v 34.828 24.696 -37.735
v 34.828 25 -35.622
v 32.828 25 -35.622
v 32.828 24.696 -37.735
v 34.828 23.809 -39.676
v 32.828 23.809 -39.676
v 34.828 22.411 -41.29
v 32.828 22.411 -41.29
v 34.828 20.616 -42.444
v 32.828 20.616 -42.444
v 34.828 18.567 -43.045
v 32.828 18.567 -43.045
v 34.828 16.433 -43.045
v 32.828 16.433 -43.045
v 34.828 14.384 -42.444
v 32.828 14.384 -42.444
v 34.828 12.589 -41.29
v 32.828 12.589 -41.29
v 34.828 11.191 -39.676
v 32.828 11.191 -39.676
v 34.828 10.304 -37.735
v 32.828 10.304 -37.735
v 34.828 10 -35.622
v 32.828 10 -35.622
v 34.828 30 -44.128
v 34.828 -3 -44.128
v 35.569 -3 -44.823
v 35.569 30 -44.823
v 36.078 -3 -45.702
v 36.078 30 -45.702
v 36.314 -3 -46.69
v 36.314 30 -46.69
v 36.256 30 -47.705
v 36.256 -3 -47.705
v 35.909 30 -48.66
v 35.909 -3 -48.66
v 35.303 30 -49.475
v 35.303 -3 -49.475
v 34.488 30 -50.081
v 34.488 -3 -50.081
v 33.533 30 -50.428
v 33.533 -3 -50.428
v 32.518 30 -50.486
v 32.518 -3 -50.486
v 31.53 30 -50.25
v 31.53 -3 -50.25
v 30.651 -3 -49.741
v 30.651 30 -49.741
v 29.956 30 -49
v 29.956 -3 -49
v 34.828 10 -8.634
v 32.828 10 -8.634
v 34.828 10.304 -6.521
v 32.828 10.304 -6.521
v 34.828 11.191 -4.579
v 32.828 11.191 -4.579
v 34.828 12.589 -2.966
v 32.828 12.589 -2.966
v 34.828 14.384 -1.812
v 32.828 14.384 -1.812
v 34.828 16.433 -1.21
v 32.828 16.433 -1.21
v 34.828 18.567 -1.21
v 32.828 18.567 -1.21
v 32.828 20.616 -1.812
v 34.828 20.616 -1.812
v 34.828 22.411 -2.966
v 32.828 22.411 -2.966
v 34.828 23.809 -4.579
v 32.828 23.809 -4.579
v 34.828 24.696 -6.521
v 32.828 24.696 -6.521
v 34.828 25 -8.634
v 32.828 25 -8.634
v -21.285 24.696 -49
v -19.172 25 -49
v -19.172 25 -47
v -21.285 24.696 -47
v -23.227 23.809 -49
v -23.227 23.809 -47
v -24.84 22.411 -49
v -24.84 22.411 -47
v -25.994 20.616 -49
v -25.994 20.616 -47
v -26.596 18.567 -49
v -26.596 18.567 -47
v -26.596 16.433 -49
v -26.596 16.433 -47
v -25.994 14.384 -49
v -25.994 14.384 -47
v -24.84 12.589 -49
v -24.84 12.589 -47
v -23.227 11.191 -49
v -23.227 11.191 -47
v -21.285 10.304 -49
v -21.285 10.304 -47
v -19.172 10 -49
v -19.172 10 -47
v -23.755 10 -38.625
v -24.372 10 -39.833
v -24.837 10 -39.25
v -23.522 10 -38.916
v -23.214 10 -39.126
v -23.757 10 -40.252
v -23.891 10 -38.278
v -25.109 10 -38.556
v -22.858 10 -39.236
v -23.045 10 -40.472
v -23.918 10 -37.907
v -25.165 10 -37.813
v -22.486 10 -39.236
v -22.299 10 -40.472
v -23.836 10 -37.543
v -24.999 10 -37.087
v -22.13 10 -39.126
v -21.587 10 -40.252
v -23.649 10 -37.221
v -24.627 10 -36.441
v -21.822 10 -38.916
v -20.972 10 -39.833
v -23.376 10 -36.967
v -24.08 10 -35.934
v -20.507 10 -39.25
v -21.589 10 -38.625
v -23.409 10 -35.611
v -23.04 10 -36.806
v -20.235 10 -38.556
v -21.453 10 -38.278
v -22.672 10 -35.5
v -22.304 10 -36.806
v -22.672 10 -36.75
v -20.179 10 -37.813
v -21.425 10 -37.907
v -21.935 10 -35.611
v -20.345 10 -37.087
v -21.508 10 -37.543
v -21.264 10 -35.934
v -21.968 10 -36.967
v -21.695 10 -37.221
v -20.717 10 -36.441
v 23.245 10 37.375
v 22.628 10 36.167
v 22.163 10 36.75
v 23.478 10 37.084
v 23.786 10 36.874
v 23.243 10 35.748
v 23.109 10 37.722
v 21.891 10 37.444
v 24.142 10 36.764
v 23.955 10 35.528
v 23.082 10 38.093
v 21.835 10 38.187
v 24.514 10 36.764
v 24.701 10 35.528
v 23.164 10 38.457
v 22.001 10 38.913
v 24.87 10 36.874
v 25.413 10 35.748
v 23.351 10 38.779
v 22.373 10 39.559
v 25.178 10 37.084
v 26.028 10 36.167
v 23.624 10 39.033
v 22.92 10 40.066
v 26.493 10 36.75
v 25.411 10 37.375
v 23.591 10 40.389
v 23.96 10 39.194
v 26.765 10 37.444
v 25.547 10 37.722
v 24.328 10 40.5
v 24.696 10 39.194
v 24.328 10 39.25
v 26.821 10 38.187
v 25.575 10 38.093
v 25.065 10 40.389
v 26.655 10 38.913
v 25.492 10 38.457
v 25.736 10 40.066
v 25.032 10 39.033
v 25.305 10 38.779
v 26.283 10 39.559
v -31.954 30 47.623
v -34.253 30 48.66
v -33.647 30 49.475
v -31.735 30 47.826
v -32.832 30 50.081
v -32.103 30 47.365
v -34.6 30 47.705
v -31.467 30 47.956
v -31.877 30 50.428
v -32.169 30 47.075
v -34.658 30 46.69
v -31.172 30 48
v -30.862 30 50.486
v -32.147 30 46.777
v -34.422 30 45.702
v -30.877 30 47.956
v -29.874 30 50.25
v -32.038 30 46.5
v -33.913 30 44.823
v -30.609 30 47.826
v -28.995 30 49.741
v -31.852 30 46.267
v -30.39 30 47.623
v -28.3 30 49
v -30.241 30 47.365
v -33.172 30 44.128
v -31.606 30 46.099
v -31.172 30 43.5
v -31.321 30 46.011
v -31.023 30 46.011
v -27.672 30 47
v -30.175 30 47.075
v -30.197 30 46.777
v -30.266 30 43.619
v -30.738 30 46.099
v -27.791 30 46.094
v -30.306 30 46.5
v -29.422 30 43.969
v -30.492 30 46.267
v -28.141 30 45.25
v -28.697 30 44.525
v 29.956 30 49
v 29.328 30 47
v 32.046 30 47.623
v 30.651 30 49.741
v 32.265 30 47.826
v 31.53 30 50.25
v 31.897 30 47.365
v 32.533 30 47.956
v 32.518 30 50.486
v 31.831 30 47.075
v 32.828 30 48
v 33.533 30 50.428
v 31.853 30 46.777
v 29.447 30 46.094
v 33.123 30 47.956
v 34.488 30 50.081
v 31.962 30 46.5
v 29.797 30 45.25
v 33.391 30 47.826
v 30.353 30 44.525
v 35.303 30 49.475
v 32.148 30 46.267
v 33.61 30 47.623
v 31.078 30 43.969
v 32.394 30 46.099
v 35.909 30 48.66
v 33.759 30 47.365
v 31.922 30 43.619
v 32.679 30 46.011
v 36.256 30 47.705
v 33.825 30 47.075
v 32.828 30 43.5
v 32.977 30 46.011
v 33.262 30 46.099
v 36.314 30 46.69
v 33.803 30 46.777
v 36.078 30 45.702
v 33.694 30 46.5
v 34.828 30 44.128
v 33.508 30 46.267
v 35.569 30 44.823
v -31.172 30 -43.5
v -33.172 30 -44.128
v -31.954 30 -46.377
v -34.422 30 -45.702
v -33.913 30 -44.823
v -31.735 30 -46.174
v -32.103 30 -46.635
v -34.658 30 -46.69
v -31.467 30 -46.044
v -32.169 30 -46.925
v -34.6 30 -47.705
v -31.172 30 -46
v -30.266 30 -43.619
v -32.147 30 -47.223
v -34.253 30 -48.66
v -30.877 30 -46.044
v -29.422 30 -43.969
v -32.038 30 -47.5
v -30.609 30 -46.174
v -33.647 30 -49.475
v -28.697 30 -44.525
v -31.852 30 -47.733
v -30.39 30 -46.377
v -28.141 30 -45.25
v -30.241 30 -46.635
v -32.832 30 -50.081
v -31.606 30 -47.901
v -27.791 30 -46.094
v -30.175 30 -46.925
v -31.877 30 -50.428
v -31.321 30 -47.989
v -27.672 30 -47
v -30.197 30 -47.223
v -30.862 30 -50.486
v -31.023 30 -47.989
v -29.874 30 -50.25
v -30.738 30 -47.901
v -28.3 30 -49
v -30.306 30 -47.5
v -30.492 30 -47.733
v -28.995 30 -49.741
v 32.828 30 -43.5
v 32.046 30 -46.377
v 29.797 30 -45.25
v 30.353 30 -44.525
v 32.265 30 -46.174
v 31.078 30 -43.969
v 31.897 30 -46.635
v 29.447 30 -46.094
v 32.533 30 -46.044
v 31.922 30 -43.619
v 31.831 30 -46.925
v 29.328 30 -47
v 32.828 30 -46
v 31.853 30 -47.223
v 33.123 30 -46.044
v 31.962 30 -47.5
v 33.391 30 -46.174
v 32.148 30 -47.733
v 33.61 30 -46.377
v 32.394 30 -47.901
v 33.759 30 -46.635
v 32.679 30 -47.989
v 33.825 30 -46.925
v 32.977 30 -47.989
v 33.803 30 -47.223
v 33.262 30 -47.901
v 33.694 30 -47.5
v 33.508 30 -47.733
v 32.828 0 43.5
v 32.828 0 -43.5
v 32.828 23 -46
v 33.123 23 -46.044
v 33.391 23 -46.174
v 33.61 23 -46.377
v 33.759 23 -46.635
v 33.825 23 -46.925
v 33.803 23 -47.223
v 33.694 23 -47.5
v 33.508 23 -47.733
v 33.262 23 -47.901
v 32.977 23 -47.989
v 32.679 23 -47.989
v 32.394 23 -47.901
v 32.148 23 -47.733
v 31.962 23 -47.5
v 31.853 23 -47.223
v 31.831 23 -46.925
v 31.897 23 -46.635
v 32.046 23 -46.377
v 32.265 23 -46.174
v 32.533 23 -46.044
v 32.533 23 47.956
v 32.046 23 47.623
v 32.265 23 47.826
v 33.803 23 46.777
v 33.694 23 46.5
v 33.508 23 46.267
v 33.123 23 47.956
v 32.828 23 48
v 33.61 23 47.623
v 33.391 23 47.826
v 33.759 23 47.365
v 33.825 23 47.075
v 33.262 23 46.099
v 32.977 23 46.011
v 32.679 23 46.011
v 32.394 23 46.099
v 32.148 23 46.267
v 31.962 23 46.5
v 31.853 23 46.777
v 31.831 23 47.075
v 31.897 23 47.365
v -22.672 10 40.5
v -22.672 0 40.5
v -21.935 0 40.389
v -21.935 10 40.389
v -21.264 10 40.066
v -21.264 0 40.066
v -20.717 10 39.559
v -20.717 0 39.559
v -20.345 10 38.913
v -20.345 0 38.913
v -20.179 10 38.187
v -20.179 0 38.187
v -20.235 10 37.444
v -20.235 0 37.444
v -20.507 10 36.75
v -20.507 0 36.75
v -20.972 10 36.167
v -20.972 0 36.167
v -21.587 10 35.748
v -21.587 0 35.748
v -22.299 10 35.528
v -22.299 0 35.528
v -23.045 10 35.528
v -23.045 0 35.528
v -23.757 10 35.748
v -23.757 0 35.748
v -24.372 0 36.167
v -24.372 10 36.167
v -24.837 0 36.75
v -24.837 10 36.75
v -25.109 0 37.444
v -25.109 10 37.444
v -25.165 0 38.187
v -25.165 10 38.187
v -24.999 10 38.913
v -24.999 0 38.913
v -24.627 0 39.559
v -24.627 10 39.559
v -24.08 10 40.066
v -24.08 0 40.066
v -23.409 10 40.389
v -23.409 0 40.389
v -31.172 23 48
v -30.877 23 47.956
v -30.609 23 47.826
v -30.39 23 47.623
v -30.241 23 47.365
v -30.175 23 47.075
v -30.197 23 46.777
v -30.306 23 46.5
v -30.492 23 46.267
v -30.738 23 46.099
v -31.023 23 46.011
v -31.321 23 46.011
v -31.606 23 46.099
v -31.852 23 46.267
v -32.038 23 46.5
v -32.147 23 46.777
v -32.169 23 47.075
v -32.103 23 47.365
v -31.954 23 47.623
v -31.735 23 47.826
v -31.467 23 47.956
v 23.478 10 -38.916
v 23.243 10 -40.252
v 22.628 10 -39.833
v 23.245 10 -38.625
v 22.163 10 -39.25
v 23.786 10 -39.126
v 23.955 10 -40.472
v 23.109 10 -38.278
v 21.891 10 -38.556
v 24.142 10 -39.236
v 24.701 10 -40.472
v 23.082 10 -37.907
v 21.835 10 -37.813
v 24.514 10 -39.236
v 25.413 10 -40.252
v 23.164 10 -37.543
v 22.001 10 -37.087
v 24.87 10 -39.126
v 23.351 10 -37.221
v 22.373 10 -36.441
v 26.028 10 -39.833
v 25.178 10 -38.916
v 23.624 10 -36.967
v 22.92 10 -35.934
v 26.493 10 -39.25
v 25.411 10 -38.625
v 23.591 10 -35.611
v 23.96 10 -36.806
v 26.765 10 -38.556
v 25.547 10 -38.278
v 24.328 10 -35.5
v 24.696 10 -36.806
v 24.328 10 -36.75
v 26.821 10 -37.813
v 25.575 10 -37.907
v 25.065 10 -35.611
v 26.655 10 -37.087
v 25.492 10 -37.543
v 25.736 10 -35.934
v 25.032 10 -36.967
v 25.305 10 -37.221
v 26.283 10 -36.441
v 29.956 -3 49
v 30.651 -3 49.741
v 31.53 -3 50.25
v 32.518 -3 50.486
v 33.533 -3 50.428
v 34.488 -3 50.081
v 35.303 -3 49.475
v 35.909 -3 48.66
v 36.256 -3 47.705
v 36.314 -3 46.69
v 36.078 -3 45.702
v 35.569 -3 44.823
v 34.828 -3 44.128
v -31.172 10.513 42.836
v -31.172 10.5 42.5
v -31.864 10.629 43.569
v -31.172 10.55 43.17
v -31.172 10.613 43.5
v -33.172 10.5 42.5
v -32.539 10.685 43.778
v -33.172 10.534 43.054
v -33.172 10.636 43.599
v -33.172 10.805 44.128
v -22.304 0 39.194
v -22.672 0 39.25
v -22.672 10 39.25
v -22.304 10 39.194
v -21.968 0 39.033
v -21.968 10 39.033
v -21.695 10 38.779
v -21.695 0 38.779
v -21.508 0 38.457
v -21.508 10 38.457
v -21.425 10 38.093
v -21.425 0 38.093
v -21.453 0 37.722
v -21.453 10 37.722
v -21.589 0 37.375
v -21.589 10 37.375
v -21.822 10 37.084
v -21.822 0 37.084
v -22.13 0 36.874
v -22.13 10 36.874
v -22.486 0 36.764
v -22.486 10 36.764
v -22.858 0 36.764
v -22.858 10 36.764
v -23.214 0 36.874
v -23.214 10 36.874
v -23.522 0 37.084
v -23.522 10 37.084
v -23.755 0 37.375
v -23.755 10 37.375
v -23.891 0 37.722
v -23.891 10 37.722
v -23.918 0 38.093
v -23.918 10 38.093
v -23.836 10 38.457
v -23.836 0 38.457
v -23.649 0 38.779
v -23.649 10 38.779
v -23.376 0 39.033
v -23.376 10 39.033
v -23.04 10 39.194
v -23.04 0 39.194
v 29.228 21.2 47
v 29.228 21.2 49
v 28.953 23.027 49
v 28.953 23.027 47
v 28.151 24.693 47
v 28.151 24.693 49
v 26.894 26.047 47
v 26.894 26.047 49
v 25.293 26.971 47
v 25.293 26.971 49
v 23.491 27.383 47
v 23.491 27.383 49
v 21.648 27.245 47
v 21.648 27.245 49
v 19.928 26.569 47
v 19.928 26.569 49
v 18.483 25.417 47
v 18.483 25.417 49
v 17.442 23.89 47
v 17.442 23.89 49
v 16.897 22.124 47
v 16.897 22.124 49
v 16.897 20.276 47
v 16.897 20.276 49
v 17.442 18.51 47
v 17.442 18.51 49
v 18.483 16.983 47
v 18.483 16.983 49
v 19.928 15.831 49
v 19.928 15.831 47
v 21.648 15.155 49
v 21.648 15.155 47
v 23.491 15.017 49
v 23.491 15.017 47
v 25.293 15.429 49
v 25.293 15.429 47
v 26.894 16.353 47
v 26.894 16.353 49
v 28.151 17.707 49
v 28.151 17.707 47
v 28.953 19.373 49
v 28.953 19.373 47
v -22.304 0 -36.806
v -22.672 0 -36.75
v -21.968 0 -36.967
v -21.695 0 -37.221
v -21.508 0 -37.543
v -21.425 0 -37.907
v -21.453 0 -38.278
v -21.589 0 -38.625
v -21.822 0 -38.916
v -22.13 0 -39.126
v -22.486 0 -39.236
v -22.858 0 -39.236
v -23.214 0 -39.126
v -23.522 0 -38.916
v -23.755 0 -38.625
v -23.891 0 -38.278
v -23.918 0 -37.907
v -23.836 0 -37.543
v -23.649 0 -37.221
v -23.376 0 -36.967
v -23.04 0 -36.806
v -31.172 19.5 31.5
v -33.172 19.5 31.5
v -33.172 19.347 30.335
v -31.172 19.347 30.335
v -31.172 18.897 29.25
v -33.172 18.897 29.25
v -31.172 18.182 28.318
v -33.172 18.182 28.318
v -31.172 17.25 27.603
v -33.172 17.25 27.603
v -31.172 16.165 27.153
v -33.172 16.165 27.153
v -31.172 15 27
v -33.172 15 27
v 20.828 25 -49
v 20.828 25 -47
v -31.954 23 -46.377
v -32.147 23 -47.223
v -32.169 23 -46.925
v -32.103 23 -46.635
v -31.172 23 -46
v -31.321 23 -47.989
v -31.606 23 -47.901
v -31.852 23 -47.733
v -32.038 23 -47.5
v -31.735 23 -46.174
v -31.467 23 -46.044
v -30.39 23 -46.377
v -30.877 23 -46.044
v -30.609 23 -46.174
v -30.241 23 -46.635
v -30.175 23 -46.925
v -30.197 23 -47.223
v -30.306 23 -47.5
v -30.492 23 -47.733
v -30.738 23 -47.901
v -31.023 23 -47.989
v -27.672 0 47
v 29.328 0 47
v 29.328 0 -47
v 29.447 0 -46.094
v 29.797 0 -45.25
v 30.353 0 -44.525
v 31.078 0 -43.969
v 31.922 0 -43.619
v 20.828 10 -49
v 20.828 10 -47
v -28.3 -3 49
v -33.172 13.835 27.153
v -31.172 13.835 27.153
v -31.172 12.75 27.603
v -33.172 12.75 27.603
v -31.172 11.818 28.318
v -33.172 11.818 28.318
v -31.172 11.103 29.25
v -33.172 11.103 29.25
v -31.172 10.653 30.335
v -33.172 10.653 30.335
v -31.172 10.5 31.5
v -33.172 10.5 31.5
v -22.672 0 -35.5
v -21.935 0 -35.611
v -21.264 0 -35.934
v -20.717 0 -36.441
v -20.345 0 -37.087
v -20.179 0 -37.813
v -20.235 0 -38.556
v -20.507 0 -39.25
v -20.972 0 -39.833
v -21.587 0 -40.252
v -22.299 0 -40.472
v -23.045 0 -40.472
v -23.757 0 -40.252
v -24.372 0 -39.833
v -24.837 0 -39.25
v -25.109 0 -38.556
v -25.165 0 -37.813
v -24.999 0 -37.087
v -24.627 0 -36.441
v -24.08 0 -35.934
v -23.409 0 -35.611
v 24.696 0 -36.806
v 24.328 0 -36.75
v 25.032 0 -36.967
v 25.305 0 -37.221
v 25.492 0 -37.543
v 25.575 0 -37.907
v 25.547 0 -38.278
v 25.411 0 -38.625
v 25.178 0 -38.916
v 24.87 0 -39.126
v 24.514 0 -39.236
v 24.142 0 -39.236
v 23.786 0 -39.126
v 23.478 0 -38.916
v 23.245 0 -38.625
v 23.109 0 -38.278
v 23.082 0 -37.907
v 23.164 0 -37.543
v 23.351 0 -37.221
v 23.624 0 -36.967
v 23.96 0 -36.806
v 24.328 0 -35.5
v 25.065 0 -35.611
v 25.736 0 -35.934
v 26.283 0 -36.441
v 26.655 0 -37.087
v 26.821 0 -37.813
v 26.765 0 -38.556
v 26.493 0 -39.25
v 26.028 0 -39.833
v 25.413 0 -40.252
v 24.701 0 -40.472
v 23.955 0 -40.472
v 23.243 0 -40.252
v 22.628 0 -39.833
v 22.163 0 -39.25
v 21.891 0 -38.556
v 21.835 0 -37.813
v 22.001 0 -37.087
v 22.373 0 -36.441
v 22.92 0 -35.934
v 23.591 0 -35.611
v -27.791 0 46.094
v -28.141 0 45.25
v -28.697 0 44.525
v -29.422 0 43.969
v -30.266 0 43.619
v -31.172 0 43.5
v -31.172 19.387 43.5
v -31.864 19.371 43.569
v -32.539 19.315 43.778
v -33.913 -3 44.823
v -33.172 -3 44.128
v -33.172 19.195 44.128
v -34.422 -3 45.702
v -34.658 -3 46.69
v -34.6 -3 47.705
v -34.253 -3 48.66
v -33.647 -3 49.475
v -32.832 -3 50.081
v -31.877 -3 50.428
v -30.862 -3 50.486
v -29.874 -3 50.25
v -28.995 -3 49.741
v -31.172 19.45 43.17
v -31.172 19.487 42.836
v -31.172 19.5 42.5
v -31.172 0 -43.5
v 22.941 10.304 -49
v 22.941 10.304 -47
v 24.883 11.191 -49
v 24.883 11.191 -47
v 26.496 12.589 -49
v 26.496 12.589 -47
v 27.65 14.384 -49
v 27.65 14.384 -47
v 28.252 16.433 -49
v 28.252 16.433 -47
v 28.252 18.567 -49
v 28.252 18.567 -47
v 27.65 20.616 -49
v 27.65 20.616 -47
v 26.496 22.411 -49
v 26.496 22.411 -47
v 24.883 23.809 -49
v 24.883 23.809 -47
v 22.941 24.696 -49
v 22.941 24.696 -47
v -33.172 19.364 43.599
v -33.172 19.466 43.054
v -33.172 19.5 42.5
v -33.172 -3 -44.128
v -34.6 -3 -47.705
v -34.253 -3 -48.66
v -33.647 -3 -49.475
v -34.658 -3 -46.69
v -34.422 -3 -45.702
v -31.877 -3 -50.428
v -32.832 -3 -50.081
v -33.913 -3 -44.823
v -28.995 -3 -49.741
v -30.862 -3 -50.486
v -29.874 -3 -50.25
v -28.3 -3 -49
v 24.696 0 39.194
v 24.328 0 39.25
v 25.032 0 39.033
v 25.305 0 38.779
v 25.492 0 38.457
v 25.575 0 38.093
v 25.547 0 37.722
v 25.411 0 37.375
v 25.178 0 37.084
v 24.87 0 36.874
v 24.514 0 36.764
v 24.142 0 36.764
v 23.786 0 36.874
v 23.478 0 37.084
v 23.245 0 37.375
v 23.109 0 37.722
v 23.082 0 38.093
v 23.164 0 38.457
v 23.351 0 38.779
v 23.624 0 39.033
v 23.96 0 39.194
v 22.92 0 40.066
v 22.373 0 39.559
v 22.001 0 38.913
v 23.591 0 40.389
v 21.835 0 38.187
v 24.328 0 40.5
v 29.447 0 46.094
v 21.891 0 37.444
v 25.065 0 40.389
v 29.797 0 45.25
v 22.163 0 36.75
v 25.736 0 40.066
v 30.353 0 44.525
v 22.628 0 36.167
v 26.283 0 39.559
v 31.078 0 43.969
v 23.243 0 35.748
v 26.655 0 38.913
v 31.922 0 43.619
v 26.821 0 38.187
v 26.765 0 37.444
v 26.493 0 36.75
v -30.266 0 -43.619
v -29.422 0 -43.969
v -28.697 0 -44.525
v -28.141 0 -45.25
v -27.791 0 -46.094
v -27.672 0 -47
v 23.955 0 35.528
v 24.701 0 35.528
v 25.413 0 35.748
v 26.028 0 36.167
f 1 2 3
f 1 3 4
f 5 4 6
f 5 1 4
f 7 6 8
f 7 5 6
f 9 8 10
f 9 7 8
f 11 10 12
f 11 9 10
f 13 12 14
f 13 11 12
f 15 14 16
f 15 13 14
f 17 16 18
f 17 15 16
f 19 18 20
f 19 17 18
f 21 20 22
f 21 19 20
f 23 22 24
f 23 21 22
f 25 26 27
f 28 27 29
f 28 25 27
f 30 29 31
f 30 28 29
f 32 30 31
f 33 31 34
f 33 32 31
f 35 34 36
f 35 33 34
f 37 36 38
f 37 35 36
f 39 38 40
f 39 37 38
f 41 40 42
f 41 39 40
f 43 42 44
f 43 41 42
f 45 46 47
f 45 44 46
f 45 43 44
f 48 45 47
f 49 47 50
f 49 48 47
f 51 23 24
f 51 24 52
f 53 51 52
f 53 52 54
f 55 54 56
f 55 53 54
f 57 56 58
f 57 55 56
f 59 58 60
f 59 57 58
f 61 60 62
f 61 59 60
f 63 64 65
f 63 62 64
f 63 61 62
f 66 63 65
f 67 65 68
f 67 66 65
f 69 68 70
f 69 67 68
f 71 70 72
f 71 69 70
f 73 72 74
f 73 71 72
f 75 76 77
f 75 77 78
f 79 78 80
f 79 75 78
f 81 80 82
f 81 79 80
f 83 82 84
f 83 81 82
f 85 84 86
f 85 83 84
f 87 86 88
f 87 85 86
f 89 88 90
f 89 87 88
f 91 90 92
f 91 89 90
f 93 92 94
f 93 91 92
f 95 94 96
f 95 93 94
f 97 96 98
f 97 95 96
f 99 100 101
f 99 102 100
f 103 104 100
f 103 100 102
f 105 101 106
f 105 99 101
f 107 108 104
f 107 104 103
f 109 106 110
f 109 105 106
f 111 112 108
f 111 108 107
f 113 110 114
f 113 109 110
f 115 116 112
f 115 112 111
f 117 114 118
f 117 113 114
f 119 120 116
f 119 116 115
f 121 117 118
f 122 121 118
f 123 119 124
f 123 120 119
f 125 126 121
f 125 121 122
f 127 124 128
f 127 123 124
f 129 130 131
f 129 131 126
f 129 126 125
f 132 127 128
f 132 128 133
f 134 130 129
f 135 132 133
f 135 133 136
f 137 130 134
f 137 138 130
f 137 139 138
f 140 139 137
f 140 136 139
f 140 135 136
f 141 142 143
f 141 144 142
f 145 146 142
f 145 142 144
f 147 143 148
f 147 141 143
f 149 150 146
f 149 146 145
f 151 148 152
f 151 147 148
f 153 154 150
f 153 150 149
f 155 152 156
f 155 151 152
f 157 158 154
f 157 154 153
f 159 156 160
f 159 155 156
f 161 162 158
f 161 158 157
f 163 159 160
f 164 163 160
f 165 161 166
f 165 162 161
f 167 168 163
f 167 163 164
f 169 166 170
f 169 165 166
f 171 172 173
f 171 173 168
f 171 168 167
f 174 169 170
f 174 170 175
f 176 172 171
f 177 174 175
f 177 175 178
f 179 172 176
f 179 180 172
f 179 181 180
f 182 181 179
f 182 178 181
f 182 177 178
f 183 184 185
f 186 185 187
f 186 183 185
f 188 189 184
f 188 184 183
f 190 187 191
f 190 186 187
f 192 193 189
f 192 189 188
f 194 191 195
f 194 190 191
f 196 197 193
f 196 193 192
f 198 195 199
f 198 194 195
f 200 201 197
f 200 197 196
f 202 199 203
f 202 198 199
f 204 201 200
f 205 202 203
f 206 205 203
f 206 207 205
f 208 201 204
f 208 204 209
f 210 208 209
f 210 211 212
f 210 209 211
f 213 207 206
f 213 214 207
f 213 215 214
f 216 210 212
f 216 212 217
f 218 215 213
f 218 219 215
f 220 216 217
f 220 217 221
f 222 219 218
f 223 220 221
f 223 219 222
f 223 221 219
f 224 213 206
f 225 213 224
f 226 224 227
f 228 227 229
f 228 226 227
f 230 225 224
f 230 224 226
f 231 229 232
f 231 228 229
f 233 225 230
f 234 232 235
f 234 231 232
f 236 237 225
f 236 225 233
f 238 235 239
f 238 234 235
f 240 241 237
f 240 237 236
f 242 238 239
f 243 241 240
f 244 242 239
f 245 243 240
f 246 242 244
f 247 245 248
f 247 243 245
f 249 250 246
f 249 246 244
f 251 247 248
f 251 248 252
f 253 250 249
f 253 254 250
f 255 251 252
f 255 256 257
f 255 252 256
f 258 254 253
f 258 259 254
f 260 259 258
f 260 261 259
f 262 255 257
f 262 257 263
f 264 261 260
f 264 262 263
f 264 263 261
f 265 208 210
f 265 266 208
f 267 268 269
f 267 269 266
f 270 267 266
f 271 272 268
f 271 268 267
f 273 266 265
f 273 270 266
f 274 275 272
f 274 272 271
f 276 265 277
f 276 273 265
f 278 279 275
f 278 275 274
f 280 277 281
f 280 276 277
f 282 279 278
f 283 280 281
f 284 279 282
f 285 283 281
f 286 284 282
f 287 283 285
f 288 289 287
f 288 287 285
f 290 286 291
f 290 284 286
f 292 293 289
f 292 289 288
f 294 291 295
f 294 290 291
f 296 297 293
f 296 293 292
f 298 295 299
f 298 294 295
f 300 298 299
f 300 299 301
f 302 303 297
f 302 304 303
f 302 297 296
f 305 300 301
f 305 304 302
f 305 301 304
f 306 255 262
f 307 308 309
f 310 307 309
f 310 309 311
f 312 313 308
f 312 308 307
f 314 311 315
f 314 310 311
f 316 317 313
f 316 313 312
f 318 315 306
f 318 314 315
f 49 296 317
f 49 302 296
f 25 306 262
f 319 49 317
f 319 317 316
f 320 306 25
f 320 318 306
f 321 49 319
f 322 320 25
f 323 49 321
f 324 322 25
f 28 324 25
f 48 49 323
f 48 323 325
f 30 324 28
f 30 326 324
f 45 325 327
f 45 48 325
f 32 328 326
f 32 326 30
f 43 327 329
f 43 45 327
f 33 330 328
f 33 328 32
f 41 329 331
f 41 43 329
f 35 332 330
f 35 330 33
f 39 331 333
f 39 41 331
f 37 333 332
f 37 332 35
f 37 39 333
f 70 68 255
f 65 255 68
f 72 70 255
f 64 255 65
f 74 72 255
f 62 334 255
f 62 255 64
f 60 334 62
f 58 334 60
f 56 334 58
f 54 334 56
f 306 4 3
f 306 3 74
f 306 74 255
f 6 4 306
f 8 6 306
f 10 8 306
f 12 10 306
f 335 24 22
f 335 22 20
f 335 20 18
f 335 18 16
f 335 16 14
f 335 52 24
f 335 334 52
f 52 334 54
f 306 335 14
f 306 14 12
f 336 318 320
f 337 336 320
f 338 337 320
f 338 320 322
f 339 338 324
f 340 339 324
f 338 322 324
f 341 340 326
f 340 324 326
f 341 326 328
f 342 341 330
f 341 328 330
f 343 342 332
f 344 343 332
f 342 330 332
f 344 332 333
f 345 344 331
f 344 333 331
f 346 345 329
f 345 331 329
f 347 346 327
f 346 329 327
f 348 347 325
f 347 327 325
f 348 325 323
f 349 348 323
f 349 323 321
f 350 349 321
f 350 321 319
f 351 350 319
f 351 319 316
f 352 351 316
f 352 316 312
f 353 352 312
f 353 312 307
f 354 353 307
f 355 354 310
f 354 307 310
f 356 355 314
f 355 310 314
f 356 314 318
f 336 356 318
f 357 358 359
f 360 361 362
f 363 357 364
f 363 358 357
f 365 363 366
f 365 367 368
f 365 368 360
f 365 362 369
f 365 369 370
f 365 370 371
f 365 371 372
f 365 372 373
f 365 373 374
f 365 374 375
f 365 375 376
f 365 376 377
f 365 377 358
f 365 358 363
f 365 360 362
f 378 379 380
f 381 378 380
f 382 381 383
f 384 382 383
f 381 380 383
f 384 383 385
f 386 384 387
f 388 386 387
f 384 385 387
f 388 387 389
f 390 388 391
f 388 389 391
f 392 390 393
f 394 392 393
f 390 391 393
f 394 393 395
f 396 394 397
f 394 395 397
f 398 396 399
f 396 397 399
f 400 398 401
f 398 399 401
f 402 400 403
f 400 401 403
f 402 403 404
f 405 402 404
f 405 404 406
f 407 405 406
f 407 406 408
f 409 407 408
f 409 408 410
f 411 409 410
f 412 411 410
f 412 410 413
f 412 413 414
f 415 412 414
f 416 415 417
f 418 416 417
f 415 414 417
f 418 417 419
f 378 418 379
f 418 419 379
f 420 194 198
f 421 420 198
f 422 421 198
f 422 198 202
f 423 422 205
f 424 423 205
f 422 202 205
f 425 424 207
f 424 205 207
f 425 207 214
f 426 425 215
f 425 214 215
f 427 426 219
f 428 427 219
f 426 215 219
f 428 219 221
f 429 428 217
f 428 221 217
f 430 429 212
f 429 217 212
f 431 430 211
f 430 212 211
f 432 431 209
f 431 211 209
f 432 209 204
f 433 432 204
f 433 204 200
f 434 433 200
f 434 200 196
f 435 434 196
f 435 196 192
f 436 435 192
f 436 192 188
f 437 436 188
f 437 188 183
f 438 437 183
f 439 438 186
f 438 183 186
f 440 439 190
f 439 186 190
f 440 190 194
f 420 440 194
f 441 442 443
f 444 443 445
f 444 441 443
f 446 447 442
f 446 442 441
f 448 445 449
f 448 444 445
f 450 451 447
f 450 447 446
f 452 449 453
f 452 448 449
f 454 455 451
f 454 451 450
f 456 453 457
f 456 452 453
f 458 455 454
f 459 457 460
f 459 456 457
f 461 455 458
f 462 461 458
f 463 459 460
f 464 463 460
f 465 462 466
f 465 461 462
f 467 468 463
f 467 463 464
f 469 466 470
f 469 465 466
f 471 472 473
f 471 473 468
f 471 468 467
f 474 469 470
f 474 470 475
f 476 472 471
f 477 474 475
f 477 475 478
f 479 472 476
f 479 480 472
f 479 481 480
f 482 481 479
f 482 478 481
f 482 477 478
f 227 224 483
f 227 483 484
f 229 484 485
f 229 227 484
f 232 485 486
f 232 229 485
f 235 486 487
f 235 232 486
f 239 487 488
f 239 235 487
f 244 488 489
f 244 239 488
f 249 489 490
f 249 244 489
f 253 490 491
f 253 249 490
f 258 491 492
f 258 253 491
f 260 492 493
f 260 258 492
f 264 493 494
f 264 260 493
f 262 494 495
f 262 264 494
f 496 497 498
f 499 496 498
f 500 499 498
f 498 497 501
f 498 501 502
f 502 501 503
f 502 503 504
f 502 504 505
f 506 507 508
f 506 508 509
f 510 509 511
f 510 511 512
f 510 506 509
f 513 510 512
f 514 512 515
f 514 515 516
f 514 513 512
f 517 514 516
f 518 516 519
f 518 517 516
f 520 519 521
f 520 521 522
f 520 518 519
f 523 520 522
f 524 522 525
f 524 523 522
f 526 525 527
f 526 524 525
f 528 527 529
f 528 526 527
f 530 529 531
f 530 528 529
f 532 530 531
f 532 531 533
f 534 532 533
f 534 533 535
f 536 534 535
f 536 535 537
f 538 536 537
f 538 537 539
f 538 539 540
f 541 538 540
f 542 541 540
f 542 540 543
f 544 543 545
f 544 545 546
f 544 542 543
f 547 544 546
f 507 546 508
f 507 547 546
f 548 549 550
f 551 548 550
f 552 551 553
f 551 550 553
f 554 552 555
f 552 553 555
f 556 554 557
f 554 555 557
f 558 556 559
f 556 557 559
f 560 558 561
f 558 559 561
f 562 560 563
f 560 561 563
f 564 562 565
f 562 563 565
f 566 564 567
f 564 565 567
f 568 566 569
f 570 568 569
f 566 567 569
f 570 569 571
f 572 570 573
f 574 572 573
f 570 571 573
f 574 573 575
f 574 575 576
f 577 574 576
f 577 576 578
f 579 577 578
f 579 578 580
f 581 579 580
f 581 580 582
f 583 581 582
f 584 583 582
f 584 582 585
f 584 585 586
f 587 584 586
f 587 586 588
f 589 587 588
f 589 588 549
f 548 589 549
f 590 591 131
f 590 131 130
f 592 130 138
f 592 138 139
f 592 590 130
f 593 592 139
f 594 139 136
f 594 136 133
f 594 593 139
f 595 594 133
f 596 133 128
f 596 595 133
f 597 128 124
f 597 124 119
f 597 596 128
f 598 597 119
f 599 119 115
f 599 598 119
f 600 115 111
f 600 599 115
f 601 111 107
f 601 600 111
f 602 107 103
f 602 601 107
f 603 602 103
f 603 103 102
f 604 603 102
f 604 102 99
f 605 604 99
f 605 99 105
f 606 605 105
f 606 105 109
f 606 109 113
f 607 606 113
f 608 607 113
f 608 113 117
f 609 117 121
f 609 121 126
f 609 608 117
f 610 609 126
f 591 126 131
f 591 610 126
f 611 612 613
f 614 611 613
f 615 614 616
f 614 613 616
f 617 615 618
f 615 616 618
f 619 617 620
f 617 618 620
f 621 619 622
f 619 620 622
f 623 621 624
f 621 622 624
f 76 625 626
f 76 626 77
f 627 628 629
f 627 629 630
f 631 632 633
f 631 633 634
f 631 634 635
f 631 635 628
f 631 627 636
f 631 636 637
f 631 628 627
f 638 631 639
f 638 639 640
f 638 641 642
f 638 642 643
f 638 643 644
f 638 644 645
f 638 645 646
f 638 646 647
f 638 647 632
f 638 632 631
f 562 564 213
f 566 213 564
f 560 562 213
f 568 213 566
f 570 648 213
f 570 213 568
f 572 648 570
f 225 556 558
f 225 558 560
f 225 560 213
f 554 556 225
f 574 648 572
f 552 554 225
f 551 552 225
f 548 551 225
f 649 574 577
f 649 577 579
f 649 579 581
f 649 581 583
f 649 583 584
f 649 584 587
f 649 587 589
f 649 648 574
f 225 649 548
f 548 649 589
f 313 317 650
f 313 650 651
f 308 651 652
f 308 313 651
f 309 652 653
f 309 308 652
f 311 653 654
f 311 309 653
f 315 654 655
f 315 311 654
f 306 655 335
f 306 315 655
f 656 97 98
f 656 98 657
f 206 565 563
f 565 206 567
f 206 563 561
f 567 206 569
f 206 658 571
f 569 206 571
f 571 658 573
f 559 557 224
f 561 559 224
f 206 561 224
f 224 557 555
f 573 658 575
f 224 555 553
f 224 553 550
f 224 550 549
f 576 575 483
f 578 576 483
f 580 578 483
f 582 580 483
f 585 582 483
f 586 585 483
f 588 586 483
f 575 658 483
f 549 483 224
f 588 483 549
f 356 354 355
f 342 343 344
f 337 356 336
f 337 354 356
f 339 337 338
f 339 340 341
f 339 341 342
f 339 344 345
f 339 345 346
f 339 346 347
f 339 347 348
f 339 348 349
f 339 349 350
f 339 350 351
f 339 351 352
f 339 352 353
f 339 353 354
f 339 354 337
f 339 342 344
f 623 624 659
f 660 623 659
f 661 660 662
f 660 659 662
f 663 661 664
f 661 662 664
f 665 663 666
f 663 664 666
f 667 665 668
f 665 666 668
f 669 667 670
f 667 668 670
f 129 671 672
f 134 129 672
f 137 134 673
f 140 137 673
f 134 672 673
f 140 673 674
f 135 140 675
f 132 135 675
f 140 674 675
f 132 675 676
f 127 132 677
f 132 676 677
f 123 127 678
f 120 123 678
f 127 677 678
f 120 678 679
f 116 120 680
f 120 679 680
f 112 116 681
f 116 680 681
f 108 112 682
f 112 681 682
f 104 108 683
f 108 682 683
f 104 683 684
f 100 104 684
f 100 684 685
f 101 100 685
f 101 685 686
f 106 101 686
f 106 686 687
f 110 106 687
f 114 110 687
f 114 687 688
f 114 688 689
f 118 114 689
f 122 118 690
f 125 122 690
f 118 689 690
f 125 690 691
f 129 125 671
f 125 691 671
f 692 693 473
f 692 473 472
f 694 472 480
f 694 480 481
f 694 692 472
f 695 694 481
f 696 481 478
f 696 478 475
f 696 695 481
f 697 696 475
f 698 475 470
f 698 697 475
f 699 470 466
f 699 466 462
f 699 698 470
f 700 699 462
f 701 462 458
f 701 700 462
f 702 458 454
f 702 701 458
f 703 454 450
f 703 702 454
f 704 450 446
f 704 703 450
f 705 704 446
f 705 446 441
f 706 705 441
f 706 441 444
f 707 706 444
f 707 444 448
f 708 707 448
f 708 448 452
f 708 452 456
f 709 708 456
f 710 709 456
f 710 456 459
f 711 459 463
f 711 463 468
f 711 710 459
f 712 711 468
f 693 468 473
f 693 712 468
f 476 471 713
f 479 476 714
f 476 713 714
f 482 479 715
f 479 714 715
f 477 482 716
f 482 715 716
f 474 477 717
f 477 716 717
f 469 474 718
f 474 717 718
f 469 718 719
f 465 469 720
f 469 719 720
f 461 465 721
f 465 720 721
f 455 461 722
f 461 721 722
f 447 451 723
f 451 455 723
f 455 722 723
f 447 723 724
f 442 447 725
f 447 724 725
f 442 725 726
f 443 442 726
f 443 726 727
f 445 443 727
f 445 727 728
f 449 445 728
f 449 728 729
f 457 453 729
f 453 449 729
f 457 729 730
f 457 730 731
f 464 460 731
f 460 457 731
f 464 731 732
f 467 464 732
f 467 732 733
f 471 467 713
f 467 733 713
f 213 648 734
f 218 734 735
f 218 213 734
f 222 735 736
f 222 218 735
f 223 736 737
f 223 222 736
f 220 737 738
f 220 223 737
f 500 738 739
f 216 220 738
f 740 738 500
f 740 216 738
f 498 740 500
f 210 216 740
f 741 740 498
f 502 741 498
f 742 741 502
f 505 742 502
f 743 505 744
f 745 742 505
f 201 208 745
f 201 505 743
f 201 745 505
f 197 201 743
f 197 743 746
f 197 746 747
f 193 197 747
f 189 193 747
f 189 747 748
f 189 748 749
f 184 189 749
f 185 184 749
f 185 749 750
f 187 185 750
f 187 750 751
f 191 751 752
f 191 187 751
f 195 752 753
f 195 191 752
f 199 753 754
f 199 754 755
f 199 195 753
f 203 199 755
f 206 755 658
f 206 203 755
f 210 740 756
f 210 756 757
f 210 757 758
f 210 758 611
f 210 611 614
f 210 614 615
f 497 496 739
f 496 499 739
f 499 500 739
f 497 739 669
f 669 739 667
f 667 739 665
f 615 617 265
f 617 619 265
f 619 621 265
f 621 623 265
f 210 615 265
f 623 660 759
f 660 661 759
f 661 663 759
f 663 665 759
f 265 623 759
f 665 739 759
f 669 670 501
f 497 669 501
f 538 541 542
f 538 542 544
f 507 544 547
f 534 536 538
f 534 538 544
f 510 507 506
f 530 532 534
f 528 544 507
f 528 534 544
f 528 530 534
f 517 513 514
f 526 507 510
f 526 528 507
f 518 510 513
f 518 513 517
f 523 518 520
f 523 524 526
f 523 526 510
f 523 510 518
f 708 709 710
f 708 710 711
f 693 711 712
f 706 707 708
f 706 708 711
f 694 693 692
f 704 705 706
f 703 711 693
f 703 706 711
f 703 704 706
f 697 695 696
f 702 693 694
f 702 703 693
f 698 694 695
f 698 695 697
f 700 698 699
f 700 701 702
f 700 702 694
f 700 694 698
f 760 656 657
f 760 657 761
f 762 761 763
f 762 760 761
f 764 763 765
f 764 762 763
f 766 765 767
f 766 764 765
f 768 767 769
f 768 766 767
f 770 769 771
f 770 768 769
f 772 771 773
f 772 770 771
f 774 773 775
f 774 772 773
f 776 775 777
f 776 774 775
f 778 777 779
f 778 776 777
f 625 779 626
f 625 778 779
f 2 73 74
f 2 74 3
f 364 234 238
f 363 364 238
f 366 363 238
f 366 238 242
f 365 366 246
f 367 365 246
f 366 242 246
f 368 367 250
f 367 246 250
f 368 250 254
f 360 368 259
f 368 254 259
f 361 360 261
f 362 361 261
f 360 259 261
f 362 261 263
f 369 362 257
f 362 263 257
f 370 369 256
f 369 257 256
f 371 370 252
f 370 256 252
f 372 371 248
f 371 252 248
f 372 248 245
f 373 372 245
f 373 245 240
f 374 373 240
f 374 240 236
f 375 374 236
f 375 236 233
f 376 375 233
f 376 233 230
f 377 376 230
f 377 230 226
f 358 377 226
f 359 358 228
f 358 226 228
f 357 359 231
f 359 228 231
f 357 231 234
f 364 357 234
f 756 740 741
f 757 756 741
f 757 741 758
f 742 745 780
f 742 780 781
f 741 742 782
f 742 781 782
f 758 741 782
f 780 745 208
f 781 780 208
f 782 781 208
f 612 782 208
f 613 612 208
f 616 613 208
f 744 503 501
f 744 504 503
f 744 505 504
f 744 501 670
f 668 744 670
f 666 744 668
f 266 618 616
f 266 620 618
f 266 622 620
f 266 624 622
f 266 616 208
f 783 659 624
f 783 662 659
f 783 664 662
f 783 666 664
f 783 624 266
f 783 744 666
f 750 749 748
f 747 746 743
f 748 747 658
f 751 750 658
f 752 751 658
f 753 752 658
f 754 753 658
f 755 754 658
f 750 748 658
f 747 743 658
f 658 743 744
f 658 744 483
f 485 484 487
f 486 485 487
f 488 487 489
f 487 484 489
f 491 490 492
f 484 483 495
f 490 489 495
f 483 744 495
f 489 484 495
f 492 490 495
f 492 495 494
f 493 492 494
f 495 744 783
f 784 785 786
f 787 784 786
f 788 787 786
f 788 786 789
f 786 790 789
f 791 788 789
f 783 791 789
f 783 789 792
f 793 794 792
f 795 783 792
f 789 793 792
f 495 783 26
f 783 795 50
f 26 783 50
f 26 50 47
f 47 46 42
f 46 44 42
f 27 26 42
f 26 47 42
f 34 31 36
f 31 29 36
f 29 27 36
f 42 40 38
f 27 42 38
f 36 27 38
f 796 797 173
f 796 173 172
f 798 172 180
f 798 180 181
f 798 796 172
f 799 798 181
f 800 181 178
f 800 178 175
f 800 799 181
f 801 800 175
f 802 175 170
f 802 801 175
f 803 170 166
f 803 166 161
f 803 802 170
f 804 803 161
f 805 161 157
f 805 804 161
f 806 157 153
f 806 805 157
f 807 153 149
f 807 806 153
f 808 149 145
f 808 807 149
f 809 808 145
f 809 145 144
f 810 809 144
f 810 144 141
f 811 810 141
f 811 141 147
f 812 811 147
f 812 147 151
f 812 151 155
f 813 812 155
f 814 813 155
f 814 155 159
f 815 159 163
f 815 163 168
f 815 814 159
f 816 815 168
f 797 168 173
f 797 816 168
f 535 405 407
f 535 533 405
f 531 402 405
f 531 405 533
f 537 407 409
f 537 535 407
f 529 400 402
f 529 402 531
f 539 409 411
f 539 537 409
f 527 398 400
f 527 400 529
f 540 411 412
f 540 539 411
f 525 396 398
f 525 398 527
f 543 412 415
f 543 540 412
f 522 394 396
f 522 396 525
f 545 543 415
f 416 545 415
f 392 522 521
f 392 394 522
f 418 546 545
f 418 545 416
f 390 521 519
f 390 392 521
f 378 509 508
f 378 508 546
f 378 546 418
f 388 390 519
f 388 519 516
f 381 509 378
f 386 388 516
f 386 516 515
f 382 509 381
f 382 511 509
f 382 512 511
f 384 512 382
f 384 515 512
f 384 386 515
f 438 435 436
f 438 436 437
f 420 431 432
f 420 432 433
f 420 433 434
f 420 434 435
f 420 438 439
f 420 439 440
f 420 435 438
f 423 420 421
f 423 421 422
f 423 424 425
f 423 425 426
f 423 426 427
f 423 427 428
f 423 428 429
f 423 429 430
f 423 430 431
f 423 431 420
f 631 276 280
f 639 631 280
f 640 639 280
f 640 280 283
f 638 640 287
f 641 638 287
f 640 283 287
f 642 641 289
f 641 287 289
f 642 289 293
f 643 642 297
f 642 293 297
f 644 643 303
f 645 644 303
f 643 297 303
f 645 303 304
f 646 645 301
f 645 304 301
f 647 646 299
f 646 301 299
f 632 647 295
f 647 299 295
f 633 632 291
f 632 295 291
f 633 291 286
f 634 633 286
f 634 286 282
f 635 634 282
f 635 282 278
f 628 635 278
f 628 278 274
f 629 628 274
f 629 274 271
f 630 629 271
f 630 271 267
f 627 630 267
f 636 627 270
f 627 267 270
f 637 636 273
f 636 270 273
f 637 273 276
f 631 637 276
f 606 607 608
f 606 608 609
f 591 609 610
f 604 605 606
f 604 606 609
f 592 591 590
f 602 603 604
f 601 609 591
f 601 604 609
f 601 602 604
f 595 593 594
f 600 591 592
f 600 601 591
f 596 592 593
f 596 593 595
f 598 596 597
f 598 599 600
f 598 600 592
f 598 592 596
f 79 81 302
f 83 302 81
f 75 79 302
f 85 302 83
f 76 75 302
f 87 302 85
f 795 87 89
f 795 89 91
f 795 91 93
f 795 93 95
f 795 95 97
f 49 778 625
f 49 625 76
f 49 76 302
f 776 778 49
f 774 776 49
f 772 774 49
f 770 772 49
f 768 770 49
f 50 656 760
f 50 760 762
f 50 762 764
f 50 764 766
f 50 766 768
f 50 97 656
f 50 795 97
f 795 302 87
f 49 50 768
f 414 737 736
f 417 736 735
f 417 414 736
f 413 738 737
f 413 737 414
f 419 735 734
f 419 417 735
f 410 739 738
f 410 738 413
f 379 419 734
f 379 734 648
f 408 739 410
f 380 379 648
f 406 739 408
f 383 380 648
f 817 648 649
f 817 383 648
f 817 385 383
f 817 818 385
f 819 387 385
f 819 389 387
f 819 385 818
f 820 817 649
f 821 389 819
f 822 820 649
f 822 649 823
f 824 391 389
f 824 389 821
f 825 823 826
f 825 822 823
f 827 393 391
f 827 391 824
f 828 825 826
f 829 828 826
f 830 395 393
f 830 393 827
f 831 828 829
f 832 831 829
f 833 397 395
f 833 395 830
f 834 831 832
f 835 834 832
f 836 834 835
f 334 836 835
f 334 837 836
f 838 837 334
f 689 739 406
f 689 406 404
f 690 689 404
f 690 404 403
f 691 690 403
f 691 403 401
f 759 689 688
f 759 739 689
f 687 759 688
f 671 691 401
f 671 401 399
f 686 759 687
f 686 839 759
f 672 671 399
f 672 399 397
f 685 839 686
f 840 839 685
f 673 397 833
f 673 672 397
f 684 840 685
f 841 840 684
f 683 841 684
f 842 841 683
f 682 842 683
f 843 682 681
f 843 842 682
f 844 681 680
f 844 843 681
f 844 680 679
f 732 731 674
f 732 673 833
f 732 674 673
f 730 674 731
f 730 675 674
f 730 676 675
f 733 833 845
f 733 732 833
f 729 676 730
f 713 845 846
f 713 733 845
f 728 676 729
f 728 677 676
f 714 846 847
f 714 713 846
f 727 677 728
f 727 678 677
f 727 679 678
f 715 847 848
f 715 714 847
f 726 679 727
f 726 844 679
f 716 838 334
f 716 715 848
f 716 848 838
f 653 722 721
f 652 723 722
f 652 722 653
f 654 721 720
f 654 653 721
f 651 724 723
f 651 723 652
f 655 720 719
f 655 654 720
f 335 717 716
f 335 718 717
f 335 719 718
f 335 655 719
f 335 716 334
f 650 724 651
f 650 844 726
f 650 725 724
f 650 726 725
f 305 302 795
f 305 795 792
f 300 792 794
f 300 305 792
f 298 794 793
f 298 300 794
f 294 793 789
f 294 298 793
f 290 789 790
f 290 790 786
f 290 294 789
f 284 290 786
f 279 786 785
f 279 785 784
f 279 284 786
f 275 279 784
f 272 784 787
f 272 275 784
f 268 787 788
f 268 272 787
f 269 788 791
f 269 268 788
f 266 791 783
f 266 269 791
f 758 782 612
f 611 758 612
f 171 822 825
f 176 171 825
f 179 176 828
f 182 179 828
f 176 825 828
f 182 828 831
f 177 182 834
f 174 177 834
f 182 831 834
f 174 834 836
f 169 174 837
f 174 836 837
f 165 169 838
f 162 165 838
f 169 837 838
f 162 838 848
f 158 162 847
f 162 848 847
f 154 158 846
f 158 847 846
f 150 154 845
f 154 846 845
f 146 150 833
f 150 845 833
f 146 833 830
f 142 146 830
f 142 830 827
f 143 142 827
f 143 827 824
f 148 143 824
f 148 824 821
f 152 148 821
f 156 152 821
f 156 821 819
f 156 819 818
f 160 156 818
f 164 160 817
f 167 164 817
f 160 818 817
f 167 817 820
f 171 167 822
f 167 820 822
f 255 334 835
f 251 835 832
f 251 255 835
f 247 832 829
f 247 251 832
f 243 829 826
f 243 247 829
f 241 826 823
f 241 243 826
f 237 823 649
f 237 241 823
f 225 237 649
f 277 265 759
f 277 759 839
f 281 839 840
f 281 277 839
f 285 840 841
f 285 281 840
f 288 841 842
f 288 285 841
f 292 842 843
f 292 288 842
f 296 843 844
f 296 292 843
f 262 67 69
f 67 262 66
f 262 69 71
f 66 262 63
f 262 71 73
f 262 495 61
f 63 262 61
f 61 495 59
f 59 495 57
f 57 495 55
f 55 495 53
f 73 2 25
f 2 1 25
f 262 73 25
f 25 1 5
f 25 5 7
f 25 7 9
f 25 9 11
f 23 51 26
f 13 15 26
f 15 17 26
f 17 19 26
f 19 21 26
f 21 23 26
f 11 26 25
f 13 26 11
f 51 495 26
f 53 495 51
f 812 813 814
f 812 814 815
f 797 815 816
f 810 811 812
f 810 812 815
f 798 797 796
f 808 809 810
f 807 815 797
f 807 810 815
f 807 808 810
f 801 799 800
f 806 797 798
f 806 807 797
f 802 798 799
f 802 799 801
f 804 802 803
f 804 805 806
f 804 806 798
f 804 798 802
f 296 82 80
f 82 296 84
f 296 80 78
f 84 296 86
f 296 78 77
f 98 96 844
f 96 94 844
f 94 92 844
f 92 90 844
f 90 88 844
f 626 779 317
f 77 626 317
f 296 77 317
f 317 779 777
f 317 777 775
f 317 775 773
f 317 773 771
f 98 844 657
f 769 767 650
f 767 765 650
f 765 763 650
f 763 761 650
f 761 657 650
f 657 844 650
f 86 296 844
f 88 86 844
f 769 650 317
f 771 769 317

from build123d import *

# Parameters (mm, degrees)
SKETCH1_R             = 2.5
SKETCH1_R_2           = 1.25
BOSS_EXTRUDE1_DEPTH   = 10
BOSS_EXTRUDE1_2_DEPTH = 10
BOSS_EXTRUDE1_3_DEPTH = 10
BOSS_EXTRUDE1_4_DEPTH = 10
SKETCH2_W             = 68
SKETCH2_H             = 98
BOSS_EXTRUDE2_DEPTH   = 3
SKETCH3_W             = 68
SKETCH3_H             = 98
SKETCH3_W_2           = 64
SKETCH3_H_2           = 94
BOSS_EXTRUDE3_DEPTH   = 30
SKETCH4_R             = 6.2
CUT_EXTRUDE1_DEPTH    = 25
CUT_EXTRUDE2_DEPTH    = 5
SKETCH7_R             = 3.5
BOSS_EXTRUDE5_DEPTH   = 33
SKETCH8_R             = 1
CUT_EXTRUDE3_DEPTH    = 7
CUT_EXTRUDE6_DEPTH    = 3.3
CUT_EXTRUDE7_DEPTH    = 10


with BuildPart() as part:
    # Sketch1 → Boss-Extrude1 (new body)
    with BuildSketch(Plane(origin=(0, 0, 0), x_dir=(1, 0, 0), z_dir=(0, 1, 0))):
        with Locations(Location((24.328009845, -38, 0), (0, 0, 270))):
            Circle(SKETCH1_R)
        with Locations(Location((24.328009845, -38, 0), (0, 0, 270))):
            Circle(SKETCH1_R_2, mode=Mode.SUBTRACT)
    extrude(amount=BOSS_EXTRUDE1_DEPTH)



with BuildPart() as body_2:
    # Sketch1 → Boss-Extrude1 2 (new body)
    with BuildSketch(Plane(origin=(0, 0, 0), x_dir=(1, 0, 0), z_dir=(0, 1, 0))):
        with Locations(Location((24.328009845, 38, 0), (0, 0, 270))):
            Circle(SKETCH1_R)
        with Locations(Location((24.328009845, 38, 0), (0, 0, 270))):
            Circle(SKETCH1_R_2, mode=Mode.SUBTRACT)
    extrude(amount=BOSS_EXTRUDE1_2_DEPTH)


with BuildPart() as body_3:
    # Sketch1 → Boss-Extrude1 3 (new body)
    with BuildSketch(Plane(origin=(0, 0, 0), x_dir=(1, 0, 0), z_dir=(0, 1, 0))):
        with Locations(Location((-22.671990155, 38, 0), (0, 0, 270))):
            Circle(SKETCH1_R)
        with Locations(Location((-22.671990155, 38, 0), (0, 0, 270))):
            Circle(SKETCH1_R_2, mode=Mode.SUBTRACT)
    extrude(amount=BOSS_EXTRUDE1_3_DEPTH)


with BuildPart() as body_4:
    # Sketch1 → Boss-Extrude1 4 (new body)
    with BuildSketch(Plane(origin=(0, 0, 0), x_dir=(1, 0, 0), z_dir=(0, 1, 0))):
        with Locations(Location((-22.671990155, -38, 0), (0, 0, 270))):
            Circle(SKETCH1_R)
        with Locations(Location((-22.671990155, -38, 0), (0, 0, 270))):
            Circle(SKETCH1_R_2, mode=Mode.SUBTRACT)
    extrude(amount=BOSS_EXTRUDE1_4_DEPTH)


with BuildPart() as part_1:
    add(part.part)

    add(body_2.part)  # Boss-Extrude2 merges body 2

    add(body_3.part)  # Boss-Extrude2 merges body 3

    add(body_4.part)  # Boss-Extrude2 merges body 4
    # Sketch2 → Boss-Extrude2 (add)
    with BuildSketch(Plane(origin=(0, 0, 0), x_dir=(1, 0, 0), z_dir=(0, 1, 0))):
        with Locations((0.828009845, 0)):
            Rectangle(SKETCH2_W, SKETCH2_H)
    extrude(amount=-BOSS_EXTRUDE2_DEPTH)

    # Sketch3 → Boss-Extrude3 (add)
    with BuildSketch(Plane(origin=(0, 0, 0), x_dir=(1, 0, 0), z_dir=(0, 1, 0))):
        with Locations((0.828009845, 0)):
            Rectangle(SKETCH3_W, SKETCH3_H)
        with Locations((0.828009845, 0)):
            Rectangle(SKETCH3_W_2, SKETCH3_H_2, mode=Mode.SUBTRACT)
    extrude(amount=BOSS_EXTRUDE3_DEPTH)

    # Sketch4 → Cut-Extrude1 (cut)
    with BuildSketch(Plane.XY.offset(49)):
        with Locations((23.028009845, 21.2)):
            Circle(SKETCH4_R)
    extrude(amount=-CUT_EXTRUDE1_DEPTH, mode=Mode.SUBTRACT)

    # Sketch5 → Cut-Extrude2 (cut)
    with BuildSketch(Plane.ZY.offset(33.171990155)):
        with BuildLine():
            Line((42.5, 19.5), (31.5, 19.5))
            ThreePointArc((31.5, 19.5), (28.318019485, 18.181980515), (27, 15))
            Line((27, 15), (37, 15))
            Line((37, 15), (47, 15))
            ThreePointArc((47, 15), (45.681980515, 18.181980515), (42.5, 19.5))
        make_face()
        with BuildLine():
            Line((37, 15), (27, 15))
            ThreePointArc((27, 15), (28.318019485, 11.818019485), (31.5, 10.5))
            Line((31.5, 10.5), (37, 10.5))
            Line((37, 10.5), (37, 15))
        make_face()
        with BuildLine():
            ThreePointArc((42.5, 10.5), (45.681980515, 11.818019485), (47, 15))
            Line((47, 15), (37, 15))
            Line((37, 15), (37, 10.5))
            Line((37, 10.5), (42.5, 10.5))
        make_face()
    extrude(amount=-CUT_EXTRUDE2_DEPTH, mode=Mode.SUBTRACT)

    # Sketch7 → Boss-Extrude5 (add)
    with BuildSketch(Plane(origin=(0, 30, 0), x_dir=(1, 0, 0), z_dir=(0, 1, 0))):
        with Locations((32.828009845, -47)):
            Circle(SKETCH7_R)
        with Locations((32.828009845, 47)):
            Circle(SKETCH7_R)
        with Locations((-31.171990155, 47)):
            Circle(SKETCH7_R)
        with Locations((-31.171990155, -47)):
            Circle(SKETCH7_R)
    extrude(amount=-BOSS_EXTRUDE5_DEPTH)

    # Sketch8 → Cut-Extrude3 (cut)
    with BuildSketch(Plane(origin=(0, 30, 0), x_dir=(1, 0, 0), z_dir=(0, 1, 0))):
        with Locations(Location((-31.171990155, -47, 0), (0, 0, 270))):
            Circle(SKETCH8_R)
        with Locations(Location((32.828009845, -47, 0), (0, 0, 270))):
            Circle(SKETCH8_R)
        with Locations(Location((32.828009845, 47, 0), (0, 0, 270))):
            Circle(SKETCH8_R)
        with Locations(Location((-31.171990155, 47, 0), (0, 0, 270))):
            Circle(SKETCH8_R)
    extrude(amount=-CUT_EXTRUDE3_DEPTH, mode=Mode.SUBTRACT)

    # Sketch12 → Cut-Extrude6 (cut)
    with BuildSketch(Plane(origin=(0, 0, -49), x_dir=(-1, 0, 0), z_dir=(0, 0, -1))):
        with BuildLine():
            Line((-20.828009845, 25), (19.171990155, 25))
            ThreePointArc((19.171990155, 25), (26.671990155, 17.5), (19.171990155, 10))
            Line((19.171990155, 10), (-20.828009845, 10))
            ThreePointArc((-20.828009845, 10), (-28.328009845, 17.5), (-20.828009845, 25))
        make_face()
    extrude(amount=-CUT_EXTRUDE6_DEPTH, mode=Mode.SUBTRACT)

    # Sketch14 → Cut-Extrude7 (cut)
    with BuildSketch(Plane(origin=(34.828009845, 0, 0), x_dir=(0, 0, -1), z_dir=(1, 0, 0))):
        with BuildLine():
            Line((8.633857568, 25), (35.621579786, 25))
            ThreePointArc((35.621579786, 25), (43.121579786, 17.5), (35.621579786, 10))
            Line((35.621579786, 10), (8.633857568, 10))
            ThreePointArc((8.633857568, 10), (1.133857568, 17.5), (8.633857568, 25))
        make_face()
    extrude(amount=-CUT_EXTRUDE7_DEPTH, mode=Mode.SUBTRACT)


solid = part_1.part
